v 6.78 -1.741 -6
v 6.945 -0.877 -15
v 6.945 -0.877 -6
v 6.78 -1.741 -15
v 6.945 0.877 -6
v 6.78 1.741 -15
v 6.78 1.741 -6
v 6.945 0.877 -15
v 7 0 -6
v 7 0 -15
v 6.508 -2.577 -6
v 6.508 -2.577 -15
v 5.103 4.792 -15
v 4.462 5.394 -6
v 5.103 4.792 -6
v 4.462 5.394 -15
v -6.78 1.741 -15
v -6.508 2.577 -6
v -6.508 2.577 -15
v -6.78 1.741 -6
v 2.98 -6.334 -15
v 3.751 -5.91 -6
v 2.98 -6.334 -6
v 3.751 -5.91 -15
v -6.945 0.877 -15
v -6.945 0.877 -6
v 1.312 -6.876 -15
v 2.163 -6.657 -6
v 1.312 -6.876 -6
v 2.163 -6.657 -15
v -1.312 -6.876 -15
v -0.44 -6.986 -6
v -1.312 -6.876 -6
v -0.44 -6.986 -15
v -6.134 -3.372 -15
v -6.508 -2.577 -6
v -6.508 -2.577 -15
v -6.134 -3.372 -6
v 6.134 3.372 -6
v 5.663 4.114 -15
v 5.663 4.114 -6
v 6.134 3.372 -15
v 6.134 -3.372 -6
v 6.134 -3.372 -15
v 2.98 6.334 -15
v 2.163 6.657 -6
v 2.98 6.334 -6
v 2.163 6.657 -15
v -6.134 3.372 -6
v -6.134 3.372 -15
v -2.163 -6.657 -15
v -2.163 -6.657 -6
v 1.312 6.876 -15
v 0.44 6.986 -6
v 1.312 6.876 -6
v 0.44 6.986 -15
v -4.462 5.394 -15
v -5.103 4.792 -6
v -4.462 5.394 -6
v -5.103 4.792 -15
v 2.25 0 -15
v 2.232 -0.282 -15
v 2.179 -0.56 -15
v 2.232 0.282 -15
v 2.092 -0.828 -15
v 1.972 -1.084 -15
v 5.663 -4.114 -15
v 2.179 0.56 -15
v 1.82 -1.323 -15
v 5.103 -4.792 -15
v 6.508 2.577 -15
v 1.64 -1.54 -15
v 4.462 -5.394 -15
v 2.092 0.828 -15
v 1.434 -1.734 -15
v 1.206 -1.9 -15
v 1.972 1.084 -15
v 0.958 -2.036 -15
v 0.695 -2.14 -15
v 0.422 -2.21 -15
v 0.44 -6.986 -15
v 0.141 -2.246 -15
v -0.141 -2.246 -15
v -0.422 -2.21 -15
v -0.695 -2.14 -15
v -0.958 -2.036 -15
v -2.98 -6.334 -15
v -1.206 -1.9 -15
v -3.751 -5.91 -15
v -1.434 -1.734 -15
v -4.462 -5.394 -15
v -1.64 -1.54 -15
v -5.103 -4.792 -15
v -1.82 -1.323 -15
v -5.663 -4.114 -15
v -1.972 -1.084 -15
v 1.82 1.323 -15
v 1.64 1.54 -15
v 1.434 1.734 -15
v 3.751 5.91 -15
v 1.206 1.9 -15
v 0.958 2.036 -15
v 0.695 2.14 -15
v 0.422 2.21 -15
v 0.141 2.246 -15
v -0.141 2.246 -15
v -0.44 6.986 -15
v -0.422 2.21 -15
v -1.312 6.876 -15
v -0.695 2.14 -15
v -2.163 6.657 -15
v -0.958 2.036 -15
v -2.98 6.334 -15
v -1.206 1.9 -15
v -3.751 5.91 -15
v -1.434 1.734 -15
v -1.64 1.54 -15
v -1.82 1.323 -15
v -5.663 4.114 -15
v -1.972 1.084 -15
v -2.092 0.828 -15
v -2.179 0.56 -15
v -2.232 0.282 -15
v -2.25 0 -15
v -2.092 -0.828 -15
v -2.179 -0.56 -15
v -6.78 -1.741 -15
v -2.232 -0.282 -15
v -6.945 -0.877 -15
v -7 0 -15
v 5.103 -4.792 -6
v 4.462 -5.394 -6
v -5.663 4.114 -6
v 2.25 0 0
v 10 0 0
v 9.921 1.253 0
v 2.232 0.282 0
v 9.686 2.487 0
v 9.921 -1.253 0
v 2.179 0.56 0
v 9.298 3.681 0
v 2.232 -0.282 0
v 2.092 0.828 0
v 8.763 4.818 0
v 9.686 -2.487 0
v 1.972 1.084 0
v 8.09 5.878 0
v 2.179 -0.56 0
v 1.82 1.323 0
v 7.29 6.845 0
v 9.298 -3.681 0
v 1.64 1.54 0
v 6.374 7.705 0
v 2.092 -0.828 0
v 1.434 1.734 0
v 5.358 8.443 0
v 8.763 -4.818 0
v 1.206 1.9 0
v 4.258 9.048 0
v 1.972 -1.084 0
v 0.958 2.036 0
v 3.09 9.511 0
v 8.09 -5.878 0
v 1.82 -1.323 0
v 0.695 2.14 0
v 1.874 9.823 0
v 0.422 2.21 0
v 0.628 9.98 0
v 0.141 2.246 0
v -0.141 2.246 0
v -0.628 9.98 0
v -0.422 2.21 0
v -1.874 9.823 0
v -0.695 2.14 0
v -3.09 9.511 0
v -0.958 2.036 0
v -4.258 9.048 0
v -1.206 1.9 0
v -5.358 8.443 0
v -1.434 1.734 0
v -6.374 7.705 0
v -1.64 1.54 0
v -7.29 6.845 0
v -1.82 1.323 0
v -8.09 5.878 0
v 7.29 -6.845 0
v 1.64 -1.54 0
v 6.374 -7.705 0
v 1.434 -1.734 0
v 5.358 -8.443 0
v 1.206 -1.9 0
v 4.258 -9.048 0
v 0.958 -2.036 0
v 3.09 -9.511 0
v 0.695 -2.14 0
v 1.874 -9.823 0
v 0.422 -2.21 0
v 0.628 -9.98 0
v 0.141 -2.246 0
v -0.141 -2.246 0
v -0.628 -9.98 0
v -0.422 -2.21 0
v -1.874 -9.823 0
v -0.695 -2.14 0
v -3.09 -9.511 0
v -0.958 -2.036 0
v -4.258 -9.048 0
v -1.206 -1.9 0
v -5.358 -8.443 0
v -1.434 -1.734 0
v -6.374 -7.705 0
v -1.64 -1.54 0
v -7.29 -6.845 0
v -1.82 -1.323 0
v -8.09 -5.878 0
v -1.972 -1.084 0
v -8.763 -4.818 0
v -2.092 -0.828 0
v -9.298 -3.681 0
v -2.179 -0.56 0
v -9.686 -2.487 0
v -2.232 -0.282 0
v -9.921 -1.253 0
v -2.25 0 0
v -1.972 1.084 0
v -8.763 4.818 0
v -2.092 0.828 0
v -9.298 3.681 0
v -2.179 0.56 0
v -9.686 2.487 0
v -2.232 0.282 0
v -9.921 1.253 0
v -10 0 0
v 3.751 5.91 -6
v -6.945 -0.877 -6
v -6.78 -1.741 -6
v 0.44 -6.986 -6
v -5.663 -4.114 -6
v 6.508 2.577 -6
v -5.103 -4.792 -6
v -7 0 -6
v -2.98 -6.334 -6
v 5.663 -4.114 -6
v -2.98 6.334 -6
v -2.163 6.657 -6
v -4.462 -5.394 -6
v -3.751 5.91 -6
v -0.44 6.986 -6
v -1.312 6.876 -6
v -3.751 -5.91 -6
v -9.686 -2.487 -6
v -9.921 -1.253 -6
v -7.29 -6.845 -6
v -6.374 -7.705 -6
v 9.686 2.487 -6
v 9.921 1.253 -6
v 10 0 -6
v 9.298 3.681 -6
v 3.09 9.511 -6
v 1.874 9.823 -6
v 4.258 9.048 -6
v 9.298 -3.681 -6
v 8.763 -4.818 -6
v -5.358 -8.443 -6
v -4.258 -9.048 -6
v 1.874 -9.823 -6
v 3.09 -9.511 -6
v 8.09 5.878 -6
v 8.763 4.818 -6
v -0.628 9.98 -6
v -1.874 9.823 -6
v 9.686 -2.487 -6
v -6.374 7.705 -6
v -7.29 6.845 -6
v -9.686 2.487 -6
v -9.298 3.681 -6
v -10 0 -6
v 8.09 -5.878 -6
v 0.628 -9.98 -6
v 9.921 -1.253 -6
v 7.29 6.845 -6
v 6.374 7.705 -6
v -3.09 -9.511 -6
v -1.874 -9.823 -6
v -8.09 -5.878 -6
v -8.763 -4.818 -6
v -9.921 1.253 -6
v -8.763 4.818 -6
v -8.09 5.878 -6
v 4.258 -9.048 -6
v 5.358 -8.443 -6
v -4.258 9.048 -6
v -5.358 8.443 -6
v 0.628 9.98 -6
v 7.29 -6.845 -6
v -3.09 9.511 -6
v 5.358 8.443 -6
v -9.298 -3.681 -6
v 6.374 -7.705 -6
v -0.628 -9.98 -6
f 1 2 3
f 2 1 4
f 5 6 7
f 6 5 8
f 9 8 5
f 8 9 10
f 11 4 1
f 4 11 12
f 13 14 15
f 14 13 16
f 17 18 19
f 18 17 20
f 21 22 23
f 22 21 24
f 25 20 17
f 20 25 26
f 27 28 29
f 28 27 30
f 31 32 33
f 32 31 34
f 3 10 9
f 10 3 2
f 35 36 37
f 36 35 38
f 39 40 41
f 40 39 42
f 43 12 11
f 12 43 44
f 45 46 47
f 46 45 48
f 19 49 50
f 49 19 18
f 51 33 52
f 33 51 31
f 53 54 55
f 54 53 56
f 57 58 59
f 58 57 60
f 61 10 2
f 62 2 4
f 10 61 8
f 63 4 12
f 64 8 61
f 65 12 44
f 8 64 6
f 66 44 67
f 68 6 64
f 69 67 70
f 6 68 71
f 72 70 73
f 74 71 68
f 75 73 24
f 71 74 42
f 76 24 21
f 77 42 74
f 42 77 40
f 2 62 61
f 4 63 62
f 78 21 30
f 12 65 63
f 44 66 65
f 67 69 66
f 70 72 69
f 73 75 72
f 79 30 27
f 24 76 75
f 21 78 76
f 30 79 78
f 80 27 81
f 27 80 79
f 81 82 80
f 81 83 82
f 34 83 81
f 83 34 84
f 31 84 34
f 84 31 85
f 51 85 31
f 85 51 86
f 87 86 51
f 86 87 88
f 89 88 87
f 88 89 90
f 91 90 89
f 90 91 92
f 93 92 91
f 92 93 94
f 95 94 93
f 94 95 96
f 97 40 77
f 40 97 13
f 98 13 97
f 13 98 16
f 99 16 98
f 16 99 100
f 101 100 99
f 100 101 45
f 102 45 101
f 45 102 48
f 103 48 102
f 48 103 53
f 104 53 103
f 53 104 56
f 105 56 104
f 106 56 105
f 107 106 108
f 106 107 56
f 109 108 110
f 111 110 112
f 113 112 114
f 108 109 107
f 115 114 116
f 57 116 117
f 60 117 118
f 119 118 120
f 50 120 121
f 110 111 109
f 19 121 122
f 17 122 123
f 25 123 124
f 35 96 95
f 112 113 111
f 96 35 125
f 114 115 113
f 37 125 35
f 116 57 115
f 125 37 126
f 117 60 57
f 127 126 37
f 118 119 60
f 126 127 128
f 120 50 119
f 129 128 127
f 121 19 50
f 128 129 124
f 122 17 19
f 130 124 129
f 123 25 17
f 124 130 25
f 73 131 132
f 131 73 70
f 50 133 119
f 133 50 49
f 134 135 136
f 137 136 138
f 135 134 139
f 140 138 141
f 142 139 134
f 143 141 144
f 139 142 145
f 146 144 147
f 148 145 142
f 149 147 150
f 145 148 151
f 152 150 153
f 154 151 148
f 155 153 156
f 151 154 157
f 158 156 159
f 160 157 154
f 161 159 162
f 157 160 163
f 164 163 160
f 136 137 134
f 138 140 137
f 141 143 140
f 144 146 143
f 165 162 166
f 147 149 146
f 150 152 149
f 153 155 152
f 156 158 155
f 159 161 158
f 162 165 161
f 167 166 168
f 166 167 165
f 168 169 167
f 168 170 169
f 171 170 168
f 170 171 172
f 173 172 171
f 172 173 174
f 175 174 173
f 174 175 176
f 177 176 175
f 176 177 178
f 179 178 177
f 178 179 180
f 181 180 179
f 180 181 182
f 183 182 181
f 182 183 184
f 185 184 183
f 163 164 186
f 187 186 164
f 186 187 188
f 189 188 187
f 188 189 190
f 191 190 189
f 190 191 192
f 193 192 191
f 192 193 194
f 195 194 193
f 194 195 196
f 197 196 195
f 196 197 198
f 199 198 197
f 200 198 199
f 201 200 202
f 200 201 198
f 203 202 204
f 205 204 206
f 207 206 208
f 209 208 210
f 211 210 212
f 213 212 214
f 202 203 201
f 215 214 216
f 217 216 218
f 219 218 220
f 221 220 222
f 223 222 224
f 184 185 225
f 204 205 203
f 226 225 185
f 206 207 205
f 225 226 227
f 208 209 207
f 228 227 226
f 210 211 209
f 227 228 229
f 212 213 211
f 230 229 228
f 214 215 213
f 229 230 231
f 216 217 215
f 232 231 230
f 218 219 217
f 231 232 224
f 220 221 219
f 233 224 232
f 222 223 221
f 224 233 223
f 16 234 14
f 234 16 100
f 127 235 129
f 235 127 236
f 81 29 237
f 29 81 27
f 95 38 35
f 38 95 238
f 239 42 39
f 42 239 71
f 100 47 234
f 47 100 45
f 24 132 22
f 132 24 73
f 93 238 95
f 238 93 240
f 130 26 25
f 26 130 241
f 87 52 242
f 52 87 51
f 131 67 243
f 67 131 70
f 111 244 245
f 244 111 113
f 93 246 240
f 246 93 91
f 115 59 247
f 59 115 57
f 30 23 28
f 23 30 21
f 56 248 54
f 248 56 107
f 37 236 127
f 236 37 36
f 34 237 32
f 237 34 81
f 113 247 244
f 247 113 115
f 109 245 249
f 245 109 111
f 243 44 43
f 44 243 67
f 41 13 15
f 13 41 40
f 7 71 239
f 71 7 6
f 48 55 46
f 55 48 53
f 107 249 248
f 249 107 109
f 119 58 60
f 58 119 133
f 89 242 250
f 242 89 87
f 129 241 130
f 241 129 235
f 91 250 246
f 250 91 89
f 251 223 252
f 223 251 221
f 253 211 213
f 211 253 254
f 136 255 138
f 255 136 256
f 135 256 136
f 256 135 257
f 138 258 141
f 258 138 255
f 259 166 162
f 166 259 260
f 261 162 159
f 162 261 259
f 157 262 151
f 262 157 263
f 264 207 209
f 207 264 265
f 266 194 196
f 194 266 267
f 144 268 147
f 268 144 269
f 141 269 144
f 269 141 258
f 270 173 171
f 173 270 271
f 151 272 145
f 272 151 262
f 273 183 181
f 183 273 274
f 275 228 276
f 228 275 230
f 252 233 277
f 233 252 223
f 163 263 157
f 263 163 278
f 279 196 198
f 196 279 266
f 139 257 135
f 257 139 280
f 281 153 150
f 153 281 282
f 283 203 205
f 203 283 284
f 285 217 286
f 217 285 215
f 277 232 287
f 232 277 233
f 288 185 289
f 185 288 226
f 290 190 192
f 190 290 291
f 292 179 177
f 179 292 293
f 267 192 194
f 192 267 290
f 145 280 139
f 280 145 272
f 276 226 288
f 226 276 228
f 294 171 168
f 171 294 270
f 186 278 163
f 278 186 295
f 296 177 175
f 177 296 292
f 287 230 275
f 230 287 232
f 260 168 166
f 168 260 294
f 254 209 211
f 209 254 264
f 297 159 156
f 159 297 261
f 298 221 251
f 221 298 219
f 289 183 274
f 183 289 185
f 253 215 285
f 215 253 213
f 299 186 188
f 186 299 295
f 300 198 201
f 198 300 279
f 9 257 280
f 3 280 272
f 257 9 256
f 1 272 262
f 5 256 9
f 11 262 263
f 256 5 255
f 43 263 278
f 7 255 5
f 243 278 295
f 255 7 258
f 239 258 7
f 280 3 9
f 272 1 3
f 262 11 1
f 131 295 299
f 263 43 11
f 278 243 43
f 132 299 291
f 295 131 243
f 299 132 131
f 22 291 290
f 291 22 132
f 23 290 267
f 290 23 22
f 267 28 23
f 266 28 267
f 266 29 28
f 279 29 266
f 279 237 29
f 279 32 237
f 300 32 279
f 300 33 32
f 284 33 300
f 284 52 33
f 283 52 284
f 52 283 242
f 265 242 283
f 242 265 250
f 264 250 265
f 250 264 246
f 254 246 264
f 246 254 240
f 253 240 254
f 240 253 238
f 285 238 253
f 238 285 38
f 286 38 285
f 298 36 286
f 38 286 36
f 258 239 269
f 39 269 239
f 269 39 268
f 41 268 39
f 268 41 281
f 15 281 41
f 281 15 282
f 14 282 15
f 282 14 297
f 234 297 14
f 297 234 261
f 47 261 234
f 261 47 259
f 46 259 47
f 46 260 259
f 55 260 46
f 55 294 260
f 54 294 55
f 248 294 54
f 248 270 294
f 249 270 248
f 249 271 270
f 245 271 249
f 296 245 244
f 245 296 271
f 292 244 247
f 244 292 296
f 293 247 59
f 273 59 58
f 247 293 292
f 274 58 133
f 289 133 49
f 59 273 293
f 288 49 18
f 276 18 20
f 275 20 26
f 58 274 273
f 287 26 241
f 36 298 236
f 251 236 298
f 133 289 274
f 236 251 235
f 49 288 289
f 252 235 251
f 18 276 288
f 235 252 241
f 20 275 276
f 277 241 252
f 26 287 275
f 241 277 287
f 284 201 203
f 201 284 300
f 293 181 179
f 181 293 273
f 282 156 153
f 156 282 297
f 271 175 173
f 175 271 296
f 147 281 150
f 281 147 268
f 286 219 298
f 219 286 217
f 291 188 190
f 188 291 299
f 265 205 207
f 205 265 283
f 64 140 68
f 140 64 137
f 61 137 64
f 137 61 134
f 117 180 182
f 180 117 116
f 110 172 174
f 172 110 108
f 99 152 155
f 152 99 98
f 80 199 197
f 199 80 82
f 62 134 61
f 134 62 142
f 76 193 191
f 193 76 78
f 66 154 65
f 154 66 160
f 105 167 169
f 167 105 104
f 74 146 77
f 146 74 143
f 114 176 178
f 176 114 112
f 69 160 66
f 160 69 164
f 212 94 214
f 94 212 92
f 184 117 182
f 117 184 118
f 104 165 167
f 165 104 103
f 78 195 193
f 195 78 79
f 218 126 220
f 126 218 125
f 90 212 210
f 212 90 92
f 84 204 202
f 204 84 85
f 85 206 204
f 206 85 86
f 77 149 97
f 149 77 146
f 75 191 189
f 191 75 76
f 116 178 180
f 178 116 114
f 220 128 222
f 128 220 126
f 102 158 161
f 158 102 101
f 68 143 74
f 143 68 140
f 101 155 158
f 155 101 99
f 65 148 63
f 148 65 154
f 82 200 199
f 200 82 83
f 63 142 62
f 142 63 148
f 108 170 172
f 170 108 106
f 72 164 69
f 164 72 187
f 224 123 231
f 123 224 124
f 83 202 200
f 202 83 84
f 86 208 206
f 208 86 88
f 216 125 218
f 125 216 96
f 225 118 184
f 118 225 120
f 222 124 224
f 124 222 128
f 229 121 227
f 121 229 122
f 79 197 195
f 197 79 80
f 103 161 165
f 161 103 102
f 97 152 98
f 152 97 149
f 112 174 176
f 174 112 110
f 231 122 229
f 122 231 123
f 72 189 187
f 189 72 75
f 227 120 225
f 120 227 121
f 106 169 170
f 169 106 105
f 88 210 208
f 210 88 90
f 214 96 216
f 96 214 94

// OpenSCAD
$fn = 50;


difference() {
	union() {
		translate(v = [0, 0, -15.0000000000]) {
			cylinder(h = 15, r = 7.0000000000);
		}
		translate(v = [0, 0, -6.0000000000]) {
			cylinder(h = 6, r = 10.0000000000);
		}
	}
	union() {
		#translate(v = [0, 0, -15]) {
			cylinder(h = 15, r = 2.2500000000);
		}
	}
}
